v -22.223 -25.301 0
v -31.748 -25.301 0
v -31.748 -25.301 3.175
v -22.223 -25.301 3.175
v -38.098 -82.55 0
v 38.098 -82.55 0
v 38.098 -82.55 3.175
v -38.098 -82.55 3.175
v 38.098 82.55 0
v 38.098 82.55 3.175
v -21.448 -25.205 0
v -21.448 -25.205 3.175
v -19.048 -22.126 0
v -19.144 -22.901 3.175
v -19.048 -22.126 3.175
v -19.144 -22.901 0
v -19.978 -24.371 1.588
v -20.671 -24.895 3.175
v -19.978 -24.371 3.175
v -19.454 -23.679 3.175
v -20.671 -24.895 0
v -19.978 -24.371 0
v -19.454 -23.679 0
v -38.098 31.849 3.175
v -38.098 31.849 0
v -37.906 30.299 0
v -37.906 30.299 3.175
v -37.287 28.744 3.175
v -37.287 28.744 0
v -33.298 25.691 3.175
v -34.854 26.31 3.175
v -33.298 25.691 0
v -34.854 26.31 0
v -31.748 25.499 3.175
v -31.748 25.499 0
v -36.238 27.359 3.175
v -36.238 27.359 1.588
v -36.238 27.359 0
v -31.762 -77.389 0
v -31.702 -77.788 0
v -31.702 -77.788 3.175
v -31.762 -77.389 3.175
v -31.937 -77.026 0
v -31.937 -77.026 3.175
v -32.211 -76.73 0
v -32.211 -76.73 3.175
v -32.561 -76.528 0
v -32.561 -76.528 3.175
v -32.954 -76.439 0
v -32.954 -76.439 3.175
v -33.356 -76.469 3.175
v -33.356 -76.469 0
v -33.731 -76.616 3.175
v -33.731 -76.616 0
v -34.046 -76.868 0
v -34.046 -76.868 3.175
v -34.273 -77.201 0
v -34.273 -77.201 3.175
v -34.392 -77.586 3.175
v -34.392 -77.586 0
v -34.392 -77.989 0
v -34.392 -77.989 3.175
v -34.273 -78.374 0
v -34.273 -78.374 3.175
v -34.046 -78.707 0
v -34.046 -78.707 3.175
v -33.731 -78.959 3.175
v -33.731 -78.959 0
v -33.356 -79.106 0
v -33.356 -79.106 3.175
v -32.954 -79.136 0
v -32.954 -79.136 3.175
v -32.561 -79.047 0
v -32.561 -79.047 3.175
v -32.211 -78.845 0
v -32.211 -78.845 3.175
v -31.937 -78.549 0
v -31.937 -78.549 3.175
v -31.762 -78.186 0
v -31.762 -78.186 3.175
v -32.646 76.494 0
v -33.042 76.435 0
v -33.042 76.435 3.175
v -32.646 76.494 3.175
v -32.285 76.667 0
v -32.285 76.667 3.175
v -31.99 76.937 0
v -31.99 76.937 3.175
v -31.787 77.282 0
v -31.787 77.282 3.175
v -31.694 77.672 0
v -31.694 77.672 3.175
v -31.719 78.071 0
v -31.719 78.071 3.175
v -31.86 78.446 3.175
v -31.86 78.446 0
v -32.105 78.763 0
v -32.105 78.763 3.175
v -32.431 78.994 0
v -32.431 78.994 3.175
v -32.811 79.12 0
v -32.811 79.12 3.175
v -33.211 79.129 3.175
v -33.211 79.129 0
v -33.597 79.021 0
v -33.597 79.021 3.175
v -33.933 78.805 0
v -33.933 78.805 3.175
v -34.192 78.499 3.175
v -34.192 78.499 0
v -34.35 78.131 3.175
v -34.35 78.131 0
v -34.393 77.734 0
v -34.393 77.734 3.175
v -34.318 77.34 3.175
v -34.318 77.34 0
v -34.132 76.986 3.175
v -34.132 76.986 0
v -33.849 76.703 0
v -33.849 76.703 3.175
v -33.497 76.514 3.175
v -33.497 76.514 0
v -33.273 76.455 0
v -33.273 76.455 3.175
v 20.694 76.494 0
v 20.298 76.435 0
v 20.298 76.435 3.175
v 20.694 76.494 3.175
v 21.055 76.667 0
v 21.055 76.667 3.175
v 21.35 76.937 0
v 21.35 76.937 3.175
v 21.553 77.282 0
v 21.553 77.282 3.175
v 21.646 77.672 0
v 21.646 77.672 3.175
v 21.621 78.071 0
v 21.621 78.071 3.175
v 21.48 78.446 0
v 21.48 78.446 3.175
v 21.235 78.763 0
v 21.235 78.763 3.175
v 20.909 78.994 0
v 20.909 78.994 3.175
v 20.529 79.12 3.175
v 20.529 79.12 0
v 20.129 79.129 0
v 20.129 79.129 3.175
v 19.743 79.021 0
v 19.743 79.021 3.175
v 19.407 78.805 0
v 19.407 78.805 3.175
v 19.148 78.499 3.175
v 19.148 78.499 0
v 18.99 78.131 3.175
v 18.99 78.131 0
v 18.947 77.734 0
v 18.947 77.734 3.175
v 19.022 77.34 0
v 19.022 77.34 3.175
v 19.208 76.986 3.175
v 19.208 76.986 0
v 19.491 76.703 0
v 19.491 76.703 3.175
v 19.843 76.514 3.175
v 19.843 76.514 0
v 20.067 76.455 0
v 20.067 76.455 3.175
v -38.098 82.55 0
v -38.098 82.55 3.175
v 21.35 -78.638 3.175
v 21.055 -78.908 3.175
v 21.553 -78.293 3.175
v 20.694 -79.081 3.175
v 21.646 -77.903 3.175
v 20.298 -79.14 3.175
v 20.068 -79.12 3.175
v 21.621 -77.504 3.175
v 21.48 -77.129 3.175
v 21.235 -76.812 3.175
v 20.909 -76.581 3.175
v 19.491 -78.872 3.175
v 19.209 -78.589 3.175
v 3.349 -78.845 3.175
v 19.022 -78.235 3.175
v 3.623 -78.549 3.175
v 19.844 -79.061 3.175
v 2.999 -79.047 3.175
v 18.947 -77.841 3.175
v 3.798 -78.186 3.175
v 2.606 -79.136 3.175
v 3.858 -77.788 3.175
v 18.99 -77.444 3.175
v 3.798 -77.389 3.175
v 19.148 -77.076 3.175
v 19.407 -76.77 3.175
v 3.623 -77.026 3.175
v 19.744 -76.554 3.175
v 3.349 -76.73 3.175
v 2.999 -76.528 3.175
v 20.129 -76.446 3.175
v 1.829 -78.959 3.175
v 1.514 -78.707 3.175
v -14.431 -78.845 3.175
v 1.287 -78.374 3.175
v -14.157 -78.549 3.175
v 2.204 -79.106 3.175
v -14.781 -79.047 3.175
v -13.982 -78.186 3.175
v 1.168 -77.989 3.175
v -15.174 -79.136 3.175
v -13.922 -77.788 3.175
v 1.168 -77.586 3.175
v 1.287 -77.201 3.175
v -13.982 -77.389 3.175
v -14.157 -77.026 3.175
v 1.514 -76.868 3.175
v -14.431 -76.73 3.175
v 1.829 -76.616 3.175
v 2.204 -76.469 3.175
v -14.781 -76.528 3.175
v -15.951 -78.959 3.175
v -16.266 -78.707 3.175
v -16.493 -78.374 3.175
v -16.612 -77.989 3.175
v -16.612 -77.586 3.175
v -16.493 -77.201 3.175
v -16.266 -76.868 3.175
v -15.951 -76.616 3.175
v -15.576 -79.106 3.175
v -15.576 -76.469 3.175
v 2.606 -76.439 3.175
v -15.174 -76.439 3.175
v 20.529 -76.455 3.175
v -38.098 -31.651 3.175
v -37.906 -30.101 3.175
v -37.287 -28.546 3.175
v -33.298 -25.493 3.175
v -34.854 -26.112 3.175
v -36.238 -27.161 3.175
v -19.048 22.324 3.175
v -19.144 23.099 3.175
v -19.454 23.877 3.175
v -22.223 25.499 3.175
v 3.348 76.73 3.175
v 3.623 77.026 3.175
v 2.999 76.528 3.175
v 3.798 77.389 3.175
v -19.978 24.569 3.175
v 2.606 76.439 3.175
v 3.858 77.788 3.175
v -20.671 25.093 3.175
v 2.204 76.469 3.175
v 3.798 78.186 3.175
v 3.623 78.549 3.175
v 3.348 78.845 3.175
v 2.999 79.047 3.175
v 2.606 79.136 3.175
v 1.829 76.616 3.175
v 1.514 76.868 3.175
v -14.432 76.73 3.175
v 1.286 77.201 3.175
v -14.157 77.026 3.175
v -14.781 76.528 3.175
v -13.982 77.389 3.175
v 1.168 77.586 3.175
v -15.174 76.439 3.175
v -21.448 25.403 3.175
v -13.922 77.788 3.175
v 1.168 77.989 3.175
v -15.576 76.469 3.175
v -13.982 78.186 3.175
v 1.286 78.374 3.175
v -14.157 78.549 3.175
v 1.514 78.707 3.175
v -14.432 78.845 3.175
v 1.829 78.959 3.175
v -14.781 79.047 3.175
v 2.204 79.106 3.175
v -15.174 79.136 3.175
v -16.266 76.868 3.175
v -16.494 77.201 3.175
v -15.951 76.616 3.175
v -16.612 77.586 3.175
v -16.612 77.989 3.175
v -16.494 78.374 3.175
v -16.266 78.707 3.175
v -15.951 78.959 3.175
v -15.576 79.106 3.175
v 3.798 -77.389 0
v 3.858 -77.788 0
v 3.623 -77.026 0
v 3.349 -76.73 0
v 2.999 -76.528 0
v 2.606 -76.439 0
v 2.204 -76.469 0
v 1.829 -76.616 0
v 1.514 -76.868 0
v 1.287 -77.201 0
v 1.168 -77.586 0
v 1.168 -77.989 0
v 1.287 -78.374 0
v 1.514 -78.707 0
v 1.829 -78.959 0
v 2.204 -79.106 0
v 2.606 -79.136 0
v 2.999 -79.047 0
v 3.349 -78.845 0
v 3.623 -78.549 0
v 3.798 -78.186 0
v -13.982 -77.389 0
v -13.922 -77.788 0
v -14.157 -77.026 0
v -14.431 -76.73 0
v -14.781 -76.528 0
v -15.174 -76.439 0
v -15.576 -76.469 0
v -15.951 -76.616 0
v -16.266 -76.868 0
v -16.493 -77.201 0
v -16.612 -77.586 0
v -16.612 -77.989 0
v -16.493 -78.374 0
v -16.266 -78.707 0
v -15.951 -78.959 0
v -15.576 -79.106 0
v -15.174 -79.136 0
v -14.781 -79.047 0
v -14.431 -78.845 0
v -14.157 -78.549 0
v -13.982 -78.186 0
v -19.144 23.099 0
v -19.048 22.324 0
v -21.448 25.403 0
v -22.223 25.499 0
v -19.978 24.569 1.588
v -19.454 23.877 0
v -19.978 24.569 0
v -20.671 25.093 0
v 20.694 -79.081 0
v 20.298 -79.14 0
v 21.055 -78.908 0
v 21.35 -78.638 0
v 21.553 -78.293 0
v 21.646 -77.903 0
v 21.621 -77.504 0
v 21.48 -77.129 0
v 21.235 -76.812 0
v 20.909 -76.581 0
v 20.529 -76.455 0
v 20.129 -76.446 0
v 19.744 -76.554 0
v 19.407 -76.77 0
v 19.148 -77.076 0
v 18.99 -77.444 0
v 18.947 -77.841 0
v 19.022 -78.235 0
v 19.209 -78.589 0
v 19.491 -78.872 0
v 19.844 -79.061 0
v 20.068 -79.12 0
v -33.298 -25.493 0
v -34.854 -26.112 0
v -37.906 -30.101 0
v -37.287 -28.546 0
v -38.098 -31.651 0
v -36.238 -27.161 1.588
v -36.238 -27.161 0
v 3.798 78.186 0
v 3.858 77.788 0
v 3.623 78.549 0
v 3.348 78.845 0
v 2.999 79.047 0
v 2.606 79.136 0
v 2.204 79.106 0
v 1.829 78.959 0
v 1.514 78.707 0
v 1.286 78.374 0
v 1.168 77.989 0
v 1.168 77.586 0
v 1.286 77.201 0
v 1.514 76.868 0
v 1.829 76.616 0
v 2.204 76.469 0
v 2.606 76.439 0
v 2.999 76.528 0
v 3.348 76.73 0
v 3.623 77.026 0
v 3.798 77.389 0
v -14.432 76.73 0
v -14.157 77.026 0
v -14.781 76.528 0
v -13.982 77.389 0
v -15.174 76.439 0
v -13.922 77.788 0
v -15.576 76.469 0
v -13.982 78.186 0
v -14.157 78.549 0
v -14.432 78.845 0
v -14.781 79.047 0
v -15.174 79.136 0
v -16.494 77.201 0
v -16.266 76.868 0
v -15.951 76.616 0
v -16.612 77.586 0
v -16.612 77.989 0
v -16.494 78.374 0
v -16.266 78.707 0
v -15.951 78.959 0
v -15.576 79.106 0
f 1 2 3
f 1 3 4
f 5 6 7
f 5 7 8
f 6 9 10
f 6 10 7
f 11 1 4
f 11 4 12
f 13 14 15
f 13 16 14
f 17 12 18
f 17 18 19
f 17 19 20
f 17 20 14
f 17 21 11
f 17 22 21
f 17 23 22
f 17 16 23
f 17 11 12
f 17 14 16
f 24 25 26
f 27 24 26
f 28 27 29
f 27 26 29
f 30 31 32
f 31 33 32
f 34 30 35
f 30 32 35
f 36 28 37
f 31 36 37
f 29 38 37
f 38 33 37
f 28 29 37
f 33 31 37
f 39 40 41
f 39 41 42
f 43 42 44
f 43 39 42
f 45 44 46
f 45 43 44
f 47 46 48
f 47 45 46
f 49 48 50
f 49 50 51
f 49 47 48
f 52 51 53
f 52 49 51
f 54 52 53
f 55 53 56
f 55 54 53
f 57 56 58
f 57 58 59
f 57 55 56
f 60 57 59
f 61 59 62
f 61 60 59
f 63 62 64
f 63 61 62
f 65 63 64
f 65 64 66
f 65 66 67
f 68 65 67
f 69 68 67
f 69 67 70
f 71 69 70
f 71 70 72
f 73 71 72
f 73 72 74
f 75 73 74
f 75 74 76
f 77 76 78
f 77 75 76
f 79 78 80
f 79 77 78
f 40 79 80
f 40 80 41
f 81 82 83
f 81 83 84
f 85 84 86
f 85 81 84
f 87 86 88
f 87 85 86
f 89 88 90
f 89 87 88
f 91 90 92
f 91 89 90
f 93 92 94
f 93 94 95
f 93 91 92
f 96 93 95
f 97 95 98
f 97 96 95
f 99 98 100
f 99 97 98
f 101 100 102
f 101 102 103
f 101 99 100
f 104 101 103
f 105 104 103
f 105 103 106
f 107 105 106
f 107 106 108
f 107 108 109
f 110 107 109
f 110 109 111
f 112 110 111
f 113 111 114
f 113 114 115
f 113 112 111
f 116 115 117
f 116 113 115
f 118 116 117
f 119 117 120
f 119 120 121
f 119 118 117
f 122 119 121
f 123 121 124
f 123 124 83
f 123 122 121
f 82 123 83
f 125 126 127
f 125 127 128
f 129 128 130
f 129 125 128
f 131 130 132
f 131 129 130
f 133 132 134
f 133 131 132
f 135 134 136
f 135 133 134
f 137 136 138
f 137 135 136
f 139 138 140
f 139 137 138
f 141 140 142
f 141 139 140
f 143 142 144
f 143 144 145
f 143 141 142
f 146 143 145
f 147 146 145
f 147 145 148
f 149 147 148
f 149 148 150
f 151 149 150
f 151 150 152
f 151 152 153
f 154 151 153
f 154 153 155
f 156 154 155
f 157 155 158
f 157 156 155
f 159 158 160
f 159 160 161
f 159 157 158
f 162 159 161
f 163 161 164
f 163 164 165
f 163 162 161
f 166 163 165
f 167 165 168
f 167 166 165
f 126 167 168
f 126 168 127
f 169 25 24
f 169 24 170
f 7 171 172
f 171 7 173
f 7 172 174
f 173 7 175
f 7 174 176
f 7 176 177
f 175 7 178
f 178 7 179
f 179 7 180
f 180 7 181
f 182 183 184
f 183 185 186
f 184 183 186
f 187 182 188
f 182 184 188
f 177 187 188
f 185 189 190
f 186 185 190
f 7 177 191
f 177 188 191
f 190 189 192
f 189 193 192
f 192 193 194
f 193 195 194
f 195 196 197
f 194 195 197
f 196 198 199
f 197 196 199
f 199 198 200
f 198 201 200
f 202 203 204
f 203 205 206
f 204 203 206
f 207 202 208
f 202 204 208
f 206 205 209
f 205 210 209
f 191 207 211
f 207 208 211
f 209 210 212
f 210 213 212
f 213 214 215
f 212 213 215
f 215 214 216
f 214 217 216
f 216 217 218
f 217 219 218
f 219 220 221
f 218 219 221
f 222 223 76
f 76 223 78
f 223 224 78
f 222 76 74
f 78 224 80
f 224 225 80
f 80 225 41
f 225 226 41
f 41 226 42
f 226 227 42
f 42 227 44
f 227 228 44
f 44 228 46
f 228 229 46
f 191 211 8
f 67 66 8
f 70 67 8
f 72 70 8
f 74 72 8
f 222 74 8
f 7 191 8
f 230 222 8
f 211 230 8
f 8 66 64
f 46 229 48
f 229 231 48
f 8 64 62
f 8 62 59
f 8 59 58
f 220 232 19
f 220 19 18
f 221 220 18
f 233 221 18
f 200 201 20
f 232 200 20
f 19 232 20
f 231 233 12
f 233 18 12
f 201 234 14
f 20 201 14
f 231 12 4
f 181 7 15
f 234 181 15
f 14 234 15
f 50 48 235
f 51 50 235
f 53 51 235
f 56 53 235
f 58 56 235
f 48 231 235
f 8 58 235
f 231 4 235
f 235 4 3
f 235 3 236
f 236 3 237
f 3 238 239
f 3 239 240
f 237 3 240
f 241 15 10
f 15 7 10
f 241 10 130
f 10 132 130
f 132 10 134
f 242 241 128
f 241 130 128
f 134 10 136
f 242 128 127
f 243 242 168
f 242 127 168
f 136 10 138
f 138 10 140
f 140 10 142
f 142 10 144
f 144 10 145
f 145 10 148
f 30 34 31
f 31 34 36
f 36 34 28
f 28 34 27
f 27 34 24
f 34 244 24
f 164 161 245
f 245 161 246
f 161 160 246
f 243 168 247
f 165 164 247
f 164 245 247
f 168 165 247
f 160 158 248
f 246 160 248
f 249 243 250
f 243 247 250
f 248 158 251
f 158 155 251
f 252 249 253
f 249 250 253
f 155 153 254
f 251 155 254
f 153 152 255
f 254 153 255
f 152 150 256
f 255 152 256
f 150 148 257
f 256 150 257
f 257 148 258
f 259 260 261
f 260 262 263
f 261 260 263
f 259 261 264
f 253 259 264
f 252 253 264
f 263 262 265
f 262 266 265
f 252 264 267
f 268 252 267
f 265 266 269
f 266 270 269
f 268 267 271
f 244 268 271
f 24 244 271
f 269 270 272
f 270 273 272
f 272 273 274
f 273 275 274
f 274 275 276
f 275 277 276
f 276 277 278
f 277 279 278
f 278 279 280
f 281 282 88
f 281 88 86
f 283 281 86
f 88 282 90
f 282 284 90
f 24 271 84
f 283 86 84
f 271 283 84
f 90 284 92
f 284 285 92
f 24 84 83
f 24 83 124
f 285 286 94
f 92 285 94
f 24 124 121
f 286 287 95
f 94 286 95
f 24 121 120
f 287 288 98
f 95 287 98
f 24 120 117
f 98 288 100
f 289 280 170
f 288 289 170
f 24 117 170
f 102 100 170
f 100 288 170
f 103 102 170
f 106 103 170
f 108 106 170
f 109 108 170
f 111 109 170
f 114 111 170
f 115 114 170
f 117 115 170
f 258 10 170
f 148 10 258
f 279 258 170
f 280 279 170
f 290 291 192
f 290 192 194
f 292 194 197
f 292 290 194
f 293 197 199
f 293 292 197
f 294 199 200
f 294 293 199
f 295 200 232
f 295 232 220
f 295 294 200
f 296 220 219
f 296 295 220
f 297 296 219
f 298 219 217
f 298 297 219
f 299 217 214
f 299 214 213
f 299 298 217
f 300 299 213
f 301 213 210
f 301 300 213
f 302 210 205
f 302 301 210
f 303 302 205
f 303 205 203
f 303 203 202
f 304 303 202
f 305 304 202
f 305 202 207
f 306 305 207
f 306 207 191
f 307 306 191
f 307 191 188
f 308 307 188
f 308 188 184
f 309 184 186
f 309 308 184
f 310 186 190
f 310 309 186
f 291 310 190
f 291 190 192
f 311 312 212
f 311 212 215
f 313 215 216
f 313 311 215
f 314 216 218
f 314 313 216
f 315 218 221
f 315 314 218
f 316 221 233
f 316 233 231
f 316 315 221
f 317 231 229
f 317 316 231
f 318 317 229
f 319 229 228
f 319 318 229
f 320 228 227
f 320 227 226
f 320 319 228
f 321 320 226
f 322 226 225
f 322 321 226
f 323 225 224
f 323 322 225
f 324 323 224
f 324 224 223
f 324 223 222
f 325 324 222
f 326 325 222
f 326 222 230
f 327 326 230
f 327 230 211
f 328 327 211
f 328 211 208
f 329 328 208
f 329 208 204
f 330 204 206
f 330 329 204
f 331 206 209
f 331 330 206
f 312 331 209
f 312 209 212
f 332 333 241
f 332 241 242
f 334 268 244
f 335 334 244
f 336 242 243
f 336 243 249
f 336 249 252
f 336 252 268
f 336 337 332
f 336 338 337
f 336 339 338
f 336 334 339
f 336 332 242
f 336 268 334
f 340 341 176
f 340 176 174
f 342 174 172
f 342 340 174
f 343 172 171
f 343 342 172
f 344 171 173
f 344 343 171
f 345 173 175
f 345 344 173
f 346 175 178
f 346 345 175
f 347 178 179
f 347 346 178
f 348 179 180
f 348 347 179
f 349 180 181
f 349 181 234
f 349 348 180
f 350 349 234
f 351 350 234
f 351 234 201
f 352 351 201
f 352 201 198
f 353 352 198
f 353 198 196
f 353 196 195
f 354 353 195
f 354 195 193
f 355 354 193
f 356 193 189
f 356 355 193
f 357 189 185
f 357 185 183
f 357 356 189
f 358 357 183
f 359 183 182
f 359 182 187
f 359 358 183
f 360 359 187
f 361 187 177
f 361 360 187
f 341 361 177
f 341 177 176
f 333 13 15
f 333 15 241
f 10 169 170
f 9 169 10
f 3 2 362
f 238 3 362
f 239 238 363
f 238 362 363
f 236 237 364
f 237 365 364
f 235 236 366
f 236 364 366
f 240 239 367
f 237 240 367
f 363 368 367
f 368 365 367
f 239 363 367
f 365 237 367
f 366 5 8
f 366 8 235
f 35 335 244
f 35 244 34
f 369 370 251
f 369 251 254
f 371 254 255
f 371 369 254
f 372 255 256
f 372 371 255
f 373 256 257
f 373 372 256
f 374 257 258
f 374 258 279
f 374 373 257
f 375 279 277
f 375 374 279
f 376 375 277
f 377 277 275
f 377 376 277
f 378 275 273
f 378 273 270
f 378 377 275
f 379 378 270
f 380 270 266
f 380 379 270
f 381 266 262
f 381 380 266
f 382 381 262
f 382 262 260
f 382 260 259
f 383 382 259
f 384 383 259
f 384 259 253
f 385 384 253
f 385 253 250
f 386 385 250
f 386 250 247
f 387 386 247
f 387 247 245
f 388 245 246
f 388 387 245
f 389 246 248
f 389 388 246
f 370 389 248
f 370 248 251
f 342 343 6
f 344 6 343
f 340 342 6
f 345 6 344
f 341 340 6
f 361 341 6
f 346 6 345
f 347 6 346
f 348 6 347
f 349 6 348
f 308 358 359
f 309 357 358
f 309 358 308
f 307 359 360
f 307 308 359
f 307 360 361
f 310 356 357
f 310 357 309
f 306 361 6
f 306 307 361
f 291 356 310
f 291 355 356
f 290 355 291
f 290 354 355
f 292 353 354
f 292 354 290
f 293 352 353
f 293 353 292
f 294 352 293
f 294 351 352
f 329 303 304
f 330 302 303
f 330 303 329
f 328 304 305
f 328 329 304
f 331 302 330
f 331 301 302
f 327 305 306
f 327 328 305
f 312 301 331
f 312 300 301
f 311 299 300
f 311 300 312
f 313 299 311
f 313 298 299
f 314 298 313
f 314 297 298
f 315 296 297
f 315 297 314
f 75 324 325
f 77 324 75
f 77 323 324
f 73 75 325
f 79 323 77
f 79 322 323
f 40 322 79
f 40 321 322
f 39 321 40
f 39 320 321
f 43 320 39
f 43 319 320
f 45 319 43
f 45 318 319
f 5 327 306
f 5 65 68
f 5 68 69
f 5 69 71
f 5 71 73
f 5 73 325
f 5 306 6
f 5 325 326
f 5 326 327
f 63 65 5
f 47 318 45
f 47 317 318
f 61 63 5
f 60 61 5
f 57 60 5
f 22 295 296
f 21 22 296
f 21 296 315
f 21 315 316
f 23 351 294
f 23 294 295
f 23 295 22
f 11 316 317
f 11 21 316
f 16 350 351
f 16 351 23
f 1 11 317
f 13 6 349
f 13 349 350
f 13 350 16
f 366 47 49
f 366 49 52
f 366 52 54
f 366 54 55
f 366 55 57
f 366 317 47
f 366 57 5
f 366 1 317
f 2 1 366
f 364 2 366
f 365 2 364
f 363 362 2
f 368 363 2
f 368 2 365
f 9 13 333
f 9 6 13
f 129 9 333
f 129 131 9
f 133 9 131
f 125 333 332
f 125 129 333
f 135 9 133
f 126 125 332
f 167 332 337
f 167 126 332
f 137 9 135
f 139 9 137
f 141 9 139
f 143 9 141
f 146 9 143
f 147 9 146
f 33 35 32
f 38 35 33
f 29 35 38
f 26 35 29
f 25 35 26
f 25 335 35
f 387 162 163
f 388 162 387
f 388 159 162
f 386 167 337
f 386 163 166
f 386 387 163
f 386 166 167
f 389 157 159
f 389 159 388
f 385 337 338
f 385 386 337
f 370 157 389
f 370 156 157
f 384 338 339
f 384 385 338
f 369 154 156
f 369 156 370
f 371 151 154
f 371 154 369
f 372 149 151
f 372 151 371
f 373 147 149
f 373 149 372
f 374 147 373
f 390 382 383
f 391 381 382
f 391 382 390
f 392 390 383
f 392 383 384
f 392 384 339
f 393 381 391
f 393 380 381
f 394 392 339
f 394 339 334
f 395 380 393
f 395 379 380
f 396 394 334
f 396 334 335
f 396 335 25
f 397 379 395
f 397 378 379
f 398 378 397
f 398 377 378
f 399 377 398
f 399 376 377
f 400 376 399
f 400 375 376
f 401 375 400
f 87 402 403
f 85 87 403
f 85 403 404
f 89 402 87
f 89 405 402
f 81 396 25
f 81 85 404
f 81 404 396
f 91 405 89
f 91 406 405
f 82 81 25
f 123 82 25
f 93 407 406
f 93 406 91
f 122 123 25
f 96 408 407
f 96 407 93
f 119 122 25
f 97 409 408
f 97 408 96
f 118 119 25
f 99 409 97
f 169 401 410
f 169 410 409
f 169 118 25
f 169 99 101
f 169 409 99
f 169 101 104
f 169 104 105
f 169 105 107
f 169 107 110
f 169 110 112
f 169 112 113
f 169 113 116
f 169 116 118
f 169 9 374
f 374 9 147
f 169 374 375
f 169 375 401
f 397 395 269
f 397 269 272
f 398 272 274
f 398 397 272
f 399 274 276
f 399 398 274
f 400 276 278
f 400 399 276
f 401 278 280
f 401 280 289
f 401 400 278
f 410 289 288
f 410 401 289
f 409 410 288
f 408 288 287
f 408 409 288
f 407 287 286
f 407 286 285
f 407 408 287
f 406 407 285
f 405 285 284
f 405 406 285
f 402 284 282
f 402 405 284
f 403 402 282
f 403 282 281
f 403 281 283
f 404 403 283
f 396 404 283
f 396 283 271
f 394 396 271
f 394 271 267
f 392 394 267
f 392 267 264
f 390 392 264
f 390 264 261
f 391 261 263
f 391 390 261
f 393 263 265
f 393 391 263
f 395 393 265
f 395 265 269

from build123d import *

# Parameters (mm, degrees)
SKETCH1_R           = 1.352550752
SKETCH1_RX          = 1.35255
SKETCH1_RY          = 1.352549248
BOSS_EXTRUDE2_DEPTH = 3.175


with BuildPart() as part:
    # Sketch1 → Boss-Extrude2 (new body)
    with BuildSketch(Plane.XY):
        with BuildLine():
            Line((38.098244435, 82.55), (38.098416123, -82.55))
            Line((38.098416123, -82.55), (-38.098244435, -82.55))
            Line((-38.098244435, -82.55), (-38.098244435, -31.651036949))
            add(Edge.make_bspline(
                [(-31.748247963, -25.301036949), (-38.098244435, -25.301036949), (-38.098244435, -31.651036949)],
                knots=[3.141592654, 3.141592654, 3.141592654, 4.71238898, 4.71238898, 4.71238898], degree=2, weights=[1, 0.707106781, 1]))
            Line((-31.748247963, -25.301036949), (-22.223253256, -25.301036949))
            add(Edge.make_bspline(
                [(-22.223253256, -25.301036949), (-19.04825502, -25.301036949), (-19.04825502, -22.126036949)],
                knots=[3.141592654, 3.141592654, 3.141592654, 4.71238898, 4.71238898, 4.71238898], degree=2, weights=[1, 0.707106781, 1]))
            Line((-19.04825502, -22.126036949), (-19.04825502, 22.323963051))
            add(Edge.make_bspline(
                [(-19.04825502, 22.323963051), (-19.04825502, 25.498963051), (-22.223253256, 25.498963051)],
                knots=[4.71238898, 4.71238898, 4.71238898, 6.283185307, 6.283185307, 6.283185307], degree=2, weights=[1, 0.707106781, 1]))
            Line((-22.223253256, 25.498963051), (-31.748247963, 25.498963051))
            add(Edge.make_bspline(
                [(-38.098244435, 31.848963051), (-38.098244435, 25.498963051), (-31.748247963, 25.498963051)],
                knots=[4.71238898, 4.71238898, 4.71238898, 6.283185307, 6.283185307, 6.283185307], degree=2, weights=[1, 0.707106781, 1]))
            Line((-38.098244435, 31.848963051), (-38.098244435, 82.55))
            Line((-38.098244435, 82.55), (38.098244435, 82.55))
        make_face()
        with Locations((2.505261643, -77.7875)):
            Circle(SKETCH1_R, mode=Mode.SUBTRACT)
        with Locations((-15.274748237, -77.7875)):
            Circle(SKETCH1_R, mode=Mode.SUBTRACT)
        with Locations((-33.054758116, -77.7875)):
            Circle(SKETCH1_R, mode=Mode.SUBTRACT)
        with Locations((2.505089955, 77.7875)):
            Circle(SKETCH1_R, mode=Mode.SUBTRACT)
        with Locations((-15.274919924, 77.7875)):
            Circle(SKETCH1_R, mode=Mode.SUBTRACT)
        with Locations(Location((20.298314341, -77.7875), (0, 0, -90))):
            Ellipse(SKETCH1_RX, SKETCH1_RY, mode=Mode.SUBTRACT)
        with Locations(Location((20.298142653, 77.7875), (0, 0, -90))):
            Ellipse(SKETCH1_RX, SKETCH1_RY, mode=Mode.SUBTRACT)
        with Locations(Location((-33.041827709, 77.7875), (0, 0, -90))):
            Ellipse(SKETCH1_RX, SKETCH1_RY, mode=Mode.SUBTRACT)
    extrude(amount=BOSS_EXTRUDE2_DEPTH)


solid = part.part
